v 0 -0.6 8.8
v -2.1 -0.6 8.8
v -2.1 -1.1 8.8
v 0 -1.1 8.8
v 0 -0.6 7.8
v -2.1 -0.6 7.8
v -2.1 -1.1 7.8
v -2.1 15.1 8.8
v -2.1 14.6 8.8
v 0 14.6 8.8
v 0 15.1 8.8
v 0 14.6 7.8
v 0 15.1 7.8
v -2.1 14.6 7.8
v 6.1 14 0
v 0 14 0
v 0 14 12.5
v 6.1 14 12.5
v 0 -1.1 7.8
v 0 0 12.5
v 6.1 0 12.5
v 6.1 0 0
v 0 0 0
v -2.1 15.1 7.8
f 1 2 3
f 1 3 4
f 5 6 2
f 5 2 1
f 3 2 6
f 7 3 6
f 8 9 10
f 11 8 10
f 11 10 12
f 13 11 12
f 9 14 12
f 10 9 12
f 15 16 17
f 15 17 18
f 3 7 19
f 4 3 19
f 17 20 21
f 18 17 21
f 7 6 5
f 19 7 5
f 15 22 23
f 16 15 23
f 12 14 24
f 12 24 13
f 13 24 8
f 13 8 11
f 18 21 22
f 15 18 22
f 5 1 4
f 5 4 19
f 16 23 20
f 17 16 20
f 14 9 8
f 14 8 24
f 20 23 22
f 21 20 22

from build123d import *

# Parameters (mm, degrees)
BOSS_EXTRUDE1_DEPTH = 14
BOSS_EXTRUDE2_START = -0.6
SKETCH1_3_W         = 2.1
SKETCH1_3_H         = 1
BOSS_EXTRUDE2_DEPTH = 0.5
BOSS_EXTRUDE3_START = 14.6
SKETCH1_4_W         = 2.1
SKETCH1_4_H         = 1
BOSS_EXTRUDE3_DEPTH = 0.5


with BuildPart() as part:
    # Sketch1 → Boss-Extrude1 (new body)
    with BuildSketch(Plane(origin=(0, 0, 0), x_dir=(1, 0, 0), z_dir=(0, 1, 0))):
        Polygon((0, 0), (0, -7.8), (0, -8.8), (0, -12.5), (6.1, -12.5), (6.1, 0), align=None)
    extrude(amount=BOSS_EXTRUDE1_DEPTH)


with BuildPart() as body_2:
    # Sketch1<3> → Boss-Extrude2 (new body)
    with BuildSketch(Plane(origin=(0, 0, 0), x_dir=(1, 0, 0), z_dir=(0, 1, 0)).offset(BOSS_EXTRUDE2_START)):
        with Locations((-1.05, -8.3)):
            Rectangle(SKETCH1_3_W, SKETCH1_3_H)
    extrude(amount=-BOSS_EXTRUDE2_DEPTH)


with BuildPart() as body_3:
    # Sketch1<4> → Boss-Extrude3 (new body)
    with BuildSketch(Plane(origin=(0, 0, 0), x_dir=(1, 0, 0), z_dir=(0, 1, 0)).offset(BOSS_EXTRUDE3_START)):
        with Locations((-1.05, -8.3)):
            Rectangle(SKETCH1_4_W, SKETCH1_4_H)
    extrude(amount=BOSS_EXTRUDE3_DEPTH)


solid = Compound([part.part, body_2.part, body_3.part])
